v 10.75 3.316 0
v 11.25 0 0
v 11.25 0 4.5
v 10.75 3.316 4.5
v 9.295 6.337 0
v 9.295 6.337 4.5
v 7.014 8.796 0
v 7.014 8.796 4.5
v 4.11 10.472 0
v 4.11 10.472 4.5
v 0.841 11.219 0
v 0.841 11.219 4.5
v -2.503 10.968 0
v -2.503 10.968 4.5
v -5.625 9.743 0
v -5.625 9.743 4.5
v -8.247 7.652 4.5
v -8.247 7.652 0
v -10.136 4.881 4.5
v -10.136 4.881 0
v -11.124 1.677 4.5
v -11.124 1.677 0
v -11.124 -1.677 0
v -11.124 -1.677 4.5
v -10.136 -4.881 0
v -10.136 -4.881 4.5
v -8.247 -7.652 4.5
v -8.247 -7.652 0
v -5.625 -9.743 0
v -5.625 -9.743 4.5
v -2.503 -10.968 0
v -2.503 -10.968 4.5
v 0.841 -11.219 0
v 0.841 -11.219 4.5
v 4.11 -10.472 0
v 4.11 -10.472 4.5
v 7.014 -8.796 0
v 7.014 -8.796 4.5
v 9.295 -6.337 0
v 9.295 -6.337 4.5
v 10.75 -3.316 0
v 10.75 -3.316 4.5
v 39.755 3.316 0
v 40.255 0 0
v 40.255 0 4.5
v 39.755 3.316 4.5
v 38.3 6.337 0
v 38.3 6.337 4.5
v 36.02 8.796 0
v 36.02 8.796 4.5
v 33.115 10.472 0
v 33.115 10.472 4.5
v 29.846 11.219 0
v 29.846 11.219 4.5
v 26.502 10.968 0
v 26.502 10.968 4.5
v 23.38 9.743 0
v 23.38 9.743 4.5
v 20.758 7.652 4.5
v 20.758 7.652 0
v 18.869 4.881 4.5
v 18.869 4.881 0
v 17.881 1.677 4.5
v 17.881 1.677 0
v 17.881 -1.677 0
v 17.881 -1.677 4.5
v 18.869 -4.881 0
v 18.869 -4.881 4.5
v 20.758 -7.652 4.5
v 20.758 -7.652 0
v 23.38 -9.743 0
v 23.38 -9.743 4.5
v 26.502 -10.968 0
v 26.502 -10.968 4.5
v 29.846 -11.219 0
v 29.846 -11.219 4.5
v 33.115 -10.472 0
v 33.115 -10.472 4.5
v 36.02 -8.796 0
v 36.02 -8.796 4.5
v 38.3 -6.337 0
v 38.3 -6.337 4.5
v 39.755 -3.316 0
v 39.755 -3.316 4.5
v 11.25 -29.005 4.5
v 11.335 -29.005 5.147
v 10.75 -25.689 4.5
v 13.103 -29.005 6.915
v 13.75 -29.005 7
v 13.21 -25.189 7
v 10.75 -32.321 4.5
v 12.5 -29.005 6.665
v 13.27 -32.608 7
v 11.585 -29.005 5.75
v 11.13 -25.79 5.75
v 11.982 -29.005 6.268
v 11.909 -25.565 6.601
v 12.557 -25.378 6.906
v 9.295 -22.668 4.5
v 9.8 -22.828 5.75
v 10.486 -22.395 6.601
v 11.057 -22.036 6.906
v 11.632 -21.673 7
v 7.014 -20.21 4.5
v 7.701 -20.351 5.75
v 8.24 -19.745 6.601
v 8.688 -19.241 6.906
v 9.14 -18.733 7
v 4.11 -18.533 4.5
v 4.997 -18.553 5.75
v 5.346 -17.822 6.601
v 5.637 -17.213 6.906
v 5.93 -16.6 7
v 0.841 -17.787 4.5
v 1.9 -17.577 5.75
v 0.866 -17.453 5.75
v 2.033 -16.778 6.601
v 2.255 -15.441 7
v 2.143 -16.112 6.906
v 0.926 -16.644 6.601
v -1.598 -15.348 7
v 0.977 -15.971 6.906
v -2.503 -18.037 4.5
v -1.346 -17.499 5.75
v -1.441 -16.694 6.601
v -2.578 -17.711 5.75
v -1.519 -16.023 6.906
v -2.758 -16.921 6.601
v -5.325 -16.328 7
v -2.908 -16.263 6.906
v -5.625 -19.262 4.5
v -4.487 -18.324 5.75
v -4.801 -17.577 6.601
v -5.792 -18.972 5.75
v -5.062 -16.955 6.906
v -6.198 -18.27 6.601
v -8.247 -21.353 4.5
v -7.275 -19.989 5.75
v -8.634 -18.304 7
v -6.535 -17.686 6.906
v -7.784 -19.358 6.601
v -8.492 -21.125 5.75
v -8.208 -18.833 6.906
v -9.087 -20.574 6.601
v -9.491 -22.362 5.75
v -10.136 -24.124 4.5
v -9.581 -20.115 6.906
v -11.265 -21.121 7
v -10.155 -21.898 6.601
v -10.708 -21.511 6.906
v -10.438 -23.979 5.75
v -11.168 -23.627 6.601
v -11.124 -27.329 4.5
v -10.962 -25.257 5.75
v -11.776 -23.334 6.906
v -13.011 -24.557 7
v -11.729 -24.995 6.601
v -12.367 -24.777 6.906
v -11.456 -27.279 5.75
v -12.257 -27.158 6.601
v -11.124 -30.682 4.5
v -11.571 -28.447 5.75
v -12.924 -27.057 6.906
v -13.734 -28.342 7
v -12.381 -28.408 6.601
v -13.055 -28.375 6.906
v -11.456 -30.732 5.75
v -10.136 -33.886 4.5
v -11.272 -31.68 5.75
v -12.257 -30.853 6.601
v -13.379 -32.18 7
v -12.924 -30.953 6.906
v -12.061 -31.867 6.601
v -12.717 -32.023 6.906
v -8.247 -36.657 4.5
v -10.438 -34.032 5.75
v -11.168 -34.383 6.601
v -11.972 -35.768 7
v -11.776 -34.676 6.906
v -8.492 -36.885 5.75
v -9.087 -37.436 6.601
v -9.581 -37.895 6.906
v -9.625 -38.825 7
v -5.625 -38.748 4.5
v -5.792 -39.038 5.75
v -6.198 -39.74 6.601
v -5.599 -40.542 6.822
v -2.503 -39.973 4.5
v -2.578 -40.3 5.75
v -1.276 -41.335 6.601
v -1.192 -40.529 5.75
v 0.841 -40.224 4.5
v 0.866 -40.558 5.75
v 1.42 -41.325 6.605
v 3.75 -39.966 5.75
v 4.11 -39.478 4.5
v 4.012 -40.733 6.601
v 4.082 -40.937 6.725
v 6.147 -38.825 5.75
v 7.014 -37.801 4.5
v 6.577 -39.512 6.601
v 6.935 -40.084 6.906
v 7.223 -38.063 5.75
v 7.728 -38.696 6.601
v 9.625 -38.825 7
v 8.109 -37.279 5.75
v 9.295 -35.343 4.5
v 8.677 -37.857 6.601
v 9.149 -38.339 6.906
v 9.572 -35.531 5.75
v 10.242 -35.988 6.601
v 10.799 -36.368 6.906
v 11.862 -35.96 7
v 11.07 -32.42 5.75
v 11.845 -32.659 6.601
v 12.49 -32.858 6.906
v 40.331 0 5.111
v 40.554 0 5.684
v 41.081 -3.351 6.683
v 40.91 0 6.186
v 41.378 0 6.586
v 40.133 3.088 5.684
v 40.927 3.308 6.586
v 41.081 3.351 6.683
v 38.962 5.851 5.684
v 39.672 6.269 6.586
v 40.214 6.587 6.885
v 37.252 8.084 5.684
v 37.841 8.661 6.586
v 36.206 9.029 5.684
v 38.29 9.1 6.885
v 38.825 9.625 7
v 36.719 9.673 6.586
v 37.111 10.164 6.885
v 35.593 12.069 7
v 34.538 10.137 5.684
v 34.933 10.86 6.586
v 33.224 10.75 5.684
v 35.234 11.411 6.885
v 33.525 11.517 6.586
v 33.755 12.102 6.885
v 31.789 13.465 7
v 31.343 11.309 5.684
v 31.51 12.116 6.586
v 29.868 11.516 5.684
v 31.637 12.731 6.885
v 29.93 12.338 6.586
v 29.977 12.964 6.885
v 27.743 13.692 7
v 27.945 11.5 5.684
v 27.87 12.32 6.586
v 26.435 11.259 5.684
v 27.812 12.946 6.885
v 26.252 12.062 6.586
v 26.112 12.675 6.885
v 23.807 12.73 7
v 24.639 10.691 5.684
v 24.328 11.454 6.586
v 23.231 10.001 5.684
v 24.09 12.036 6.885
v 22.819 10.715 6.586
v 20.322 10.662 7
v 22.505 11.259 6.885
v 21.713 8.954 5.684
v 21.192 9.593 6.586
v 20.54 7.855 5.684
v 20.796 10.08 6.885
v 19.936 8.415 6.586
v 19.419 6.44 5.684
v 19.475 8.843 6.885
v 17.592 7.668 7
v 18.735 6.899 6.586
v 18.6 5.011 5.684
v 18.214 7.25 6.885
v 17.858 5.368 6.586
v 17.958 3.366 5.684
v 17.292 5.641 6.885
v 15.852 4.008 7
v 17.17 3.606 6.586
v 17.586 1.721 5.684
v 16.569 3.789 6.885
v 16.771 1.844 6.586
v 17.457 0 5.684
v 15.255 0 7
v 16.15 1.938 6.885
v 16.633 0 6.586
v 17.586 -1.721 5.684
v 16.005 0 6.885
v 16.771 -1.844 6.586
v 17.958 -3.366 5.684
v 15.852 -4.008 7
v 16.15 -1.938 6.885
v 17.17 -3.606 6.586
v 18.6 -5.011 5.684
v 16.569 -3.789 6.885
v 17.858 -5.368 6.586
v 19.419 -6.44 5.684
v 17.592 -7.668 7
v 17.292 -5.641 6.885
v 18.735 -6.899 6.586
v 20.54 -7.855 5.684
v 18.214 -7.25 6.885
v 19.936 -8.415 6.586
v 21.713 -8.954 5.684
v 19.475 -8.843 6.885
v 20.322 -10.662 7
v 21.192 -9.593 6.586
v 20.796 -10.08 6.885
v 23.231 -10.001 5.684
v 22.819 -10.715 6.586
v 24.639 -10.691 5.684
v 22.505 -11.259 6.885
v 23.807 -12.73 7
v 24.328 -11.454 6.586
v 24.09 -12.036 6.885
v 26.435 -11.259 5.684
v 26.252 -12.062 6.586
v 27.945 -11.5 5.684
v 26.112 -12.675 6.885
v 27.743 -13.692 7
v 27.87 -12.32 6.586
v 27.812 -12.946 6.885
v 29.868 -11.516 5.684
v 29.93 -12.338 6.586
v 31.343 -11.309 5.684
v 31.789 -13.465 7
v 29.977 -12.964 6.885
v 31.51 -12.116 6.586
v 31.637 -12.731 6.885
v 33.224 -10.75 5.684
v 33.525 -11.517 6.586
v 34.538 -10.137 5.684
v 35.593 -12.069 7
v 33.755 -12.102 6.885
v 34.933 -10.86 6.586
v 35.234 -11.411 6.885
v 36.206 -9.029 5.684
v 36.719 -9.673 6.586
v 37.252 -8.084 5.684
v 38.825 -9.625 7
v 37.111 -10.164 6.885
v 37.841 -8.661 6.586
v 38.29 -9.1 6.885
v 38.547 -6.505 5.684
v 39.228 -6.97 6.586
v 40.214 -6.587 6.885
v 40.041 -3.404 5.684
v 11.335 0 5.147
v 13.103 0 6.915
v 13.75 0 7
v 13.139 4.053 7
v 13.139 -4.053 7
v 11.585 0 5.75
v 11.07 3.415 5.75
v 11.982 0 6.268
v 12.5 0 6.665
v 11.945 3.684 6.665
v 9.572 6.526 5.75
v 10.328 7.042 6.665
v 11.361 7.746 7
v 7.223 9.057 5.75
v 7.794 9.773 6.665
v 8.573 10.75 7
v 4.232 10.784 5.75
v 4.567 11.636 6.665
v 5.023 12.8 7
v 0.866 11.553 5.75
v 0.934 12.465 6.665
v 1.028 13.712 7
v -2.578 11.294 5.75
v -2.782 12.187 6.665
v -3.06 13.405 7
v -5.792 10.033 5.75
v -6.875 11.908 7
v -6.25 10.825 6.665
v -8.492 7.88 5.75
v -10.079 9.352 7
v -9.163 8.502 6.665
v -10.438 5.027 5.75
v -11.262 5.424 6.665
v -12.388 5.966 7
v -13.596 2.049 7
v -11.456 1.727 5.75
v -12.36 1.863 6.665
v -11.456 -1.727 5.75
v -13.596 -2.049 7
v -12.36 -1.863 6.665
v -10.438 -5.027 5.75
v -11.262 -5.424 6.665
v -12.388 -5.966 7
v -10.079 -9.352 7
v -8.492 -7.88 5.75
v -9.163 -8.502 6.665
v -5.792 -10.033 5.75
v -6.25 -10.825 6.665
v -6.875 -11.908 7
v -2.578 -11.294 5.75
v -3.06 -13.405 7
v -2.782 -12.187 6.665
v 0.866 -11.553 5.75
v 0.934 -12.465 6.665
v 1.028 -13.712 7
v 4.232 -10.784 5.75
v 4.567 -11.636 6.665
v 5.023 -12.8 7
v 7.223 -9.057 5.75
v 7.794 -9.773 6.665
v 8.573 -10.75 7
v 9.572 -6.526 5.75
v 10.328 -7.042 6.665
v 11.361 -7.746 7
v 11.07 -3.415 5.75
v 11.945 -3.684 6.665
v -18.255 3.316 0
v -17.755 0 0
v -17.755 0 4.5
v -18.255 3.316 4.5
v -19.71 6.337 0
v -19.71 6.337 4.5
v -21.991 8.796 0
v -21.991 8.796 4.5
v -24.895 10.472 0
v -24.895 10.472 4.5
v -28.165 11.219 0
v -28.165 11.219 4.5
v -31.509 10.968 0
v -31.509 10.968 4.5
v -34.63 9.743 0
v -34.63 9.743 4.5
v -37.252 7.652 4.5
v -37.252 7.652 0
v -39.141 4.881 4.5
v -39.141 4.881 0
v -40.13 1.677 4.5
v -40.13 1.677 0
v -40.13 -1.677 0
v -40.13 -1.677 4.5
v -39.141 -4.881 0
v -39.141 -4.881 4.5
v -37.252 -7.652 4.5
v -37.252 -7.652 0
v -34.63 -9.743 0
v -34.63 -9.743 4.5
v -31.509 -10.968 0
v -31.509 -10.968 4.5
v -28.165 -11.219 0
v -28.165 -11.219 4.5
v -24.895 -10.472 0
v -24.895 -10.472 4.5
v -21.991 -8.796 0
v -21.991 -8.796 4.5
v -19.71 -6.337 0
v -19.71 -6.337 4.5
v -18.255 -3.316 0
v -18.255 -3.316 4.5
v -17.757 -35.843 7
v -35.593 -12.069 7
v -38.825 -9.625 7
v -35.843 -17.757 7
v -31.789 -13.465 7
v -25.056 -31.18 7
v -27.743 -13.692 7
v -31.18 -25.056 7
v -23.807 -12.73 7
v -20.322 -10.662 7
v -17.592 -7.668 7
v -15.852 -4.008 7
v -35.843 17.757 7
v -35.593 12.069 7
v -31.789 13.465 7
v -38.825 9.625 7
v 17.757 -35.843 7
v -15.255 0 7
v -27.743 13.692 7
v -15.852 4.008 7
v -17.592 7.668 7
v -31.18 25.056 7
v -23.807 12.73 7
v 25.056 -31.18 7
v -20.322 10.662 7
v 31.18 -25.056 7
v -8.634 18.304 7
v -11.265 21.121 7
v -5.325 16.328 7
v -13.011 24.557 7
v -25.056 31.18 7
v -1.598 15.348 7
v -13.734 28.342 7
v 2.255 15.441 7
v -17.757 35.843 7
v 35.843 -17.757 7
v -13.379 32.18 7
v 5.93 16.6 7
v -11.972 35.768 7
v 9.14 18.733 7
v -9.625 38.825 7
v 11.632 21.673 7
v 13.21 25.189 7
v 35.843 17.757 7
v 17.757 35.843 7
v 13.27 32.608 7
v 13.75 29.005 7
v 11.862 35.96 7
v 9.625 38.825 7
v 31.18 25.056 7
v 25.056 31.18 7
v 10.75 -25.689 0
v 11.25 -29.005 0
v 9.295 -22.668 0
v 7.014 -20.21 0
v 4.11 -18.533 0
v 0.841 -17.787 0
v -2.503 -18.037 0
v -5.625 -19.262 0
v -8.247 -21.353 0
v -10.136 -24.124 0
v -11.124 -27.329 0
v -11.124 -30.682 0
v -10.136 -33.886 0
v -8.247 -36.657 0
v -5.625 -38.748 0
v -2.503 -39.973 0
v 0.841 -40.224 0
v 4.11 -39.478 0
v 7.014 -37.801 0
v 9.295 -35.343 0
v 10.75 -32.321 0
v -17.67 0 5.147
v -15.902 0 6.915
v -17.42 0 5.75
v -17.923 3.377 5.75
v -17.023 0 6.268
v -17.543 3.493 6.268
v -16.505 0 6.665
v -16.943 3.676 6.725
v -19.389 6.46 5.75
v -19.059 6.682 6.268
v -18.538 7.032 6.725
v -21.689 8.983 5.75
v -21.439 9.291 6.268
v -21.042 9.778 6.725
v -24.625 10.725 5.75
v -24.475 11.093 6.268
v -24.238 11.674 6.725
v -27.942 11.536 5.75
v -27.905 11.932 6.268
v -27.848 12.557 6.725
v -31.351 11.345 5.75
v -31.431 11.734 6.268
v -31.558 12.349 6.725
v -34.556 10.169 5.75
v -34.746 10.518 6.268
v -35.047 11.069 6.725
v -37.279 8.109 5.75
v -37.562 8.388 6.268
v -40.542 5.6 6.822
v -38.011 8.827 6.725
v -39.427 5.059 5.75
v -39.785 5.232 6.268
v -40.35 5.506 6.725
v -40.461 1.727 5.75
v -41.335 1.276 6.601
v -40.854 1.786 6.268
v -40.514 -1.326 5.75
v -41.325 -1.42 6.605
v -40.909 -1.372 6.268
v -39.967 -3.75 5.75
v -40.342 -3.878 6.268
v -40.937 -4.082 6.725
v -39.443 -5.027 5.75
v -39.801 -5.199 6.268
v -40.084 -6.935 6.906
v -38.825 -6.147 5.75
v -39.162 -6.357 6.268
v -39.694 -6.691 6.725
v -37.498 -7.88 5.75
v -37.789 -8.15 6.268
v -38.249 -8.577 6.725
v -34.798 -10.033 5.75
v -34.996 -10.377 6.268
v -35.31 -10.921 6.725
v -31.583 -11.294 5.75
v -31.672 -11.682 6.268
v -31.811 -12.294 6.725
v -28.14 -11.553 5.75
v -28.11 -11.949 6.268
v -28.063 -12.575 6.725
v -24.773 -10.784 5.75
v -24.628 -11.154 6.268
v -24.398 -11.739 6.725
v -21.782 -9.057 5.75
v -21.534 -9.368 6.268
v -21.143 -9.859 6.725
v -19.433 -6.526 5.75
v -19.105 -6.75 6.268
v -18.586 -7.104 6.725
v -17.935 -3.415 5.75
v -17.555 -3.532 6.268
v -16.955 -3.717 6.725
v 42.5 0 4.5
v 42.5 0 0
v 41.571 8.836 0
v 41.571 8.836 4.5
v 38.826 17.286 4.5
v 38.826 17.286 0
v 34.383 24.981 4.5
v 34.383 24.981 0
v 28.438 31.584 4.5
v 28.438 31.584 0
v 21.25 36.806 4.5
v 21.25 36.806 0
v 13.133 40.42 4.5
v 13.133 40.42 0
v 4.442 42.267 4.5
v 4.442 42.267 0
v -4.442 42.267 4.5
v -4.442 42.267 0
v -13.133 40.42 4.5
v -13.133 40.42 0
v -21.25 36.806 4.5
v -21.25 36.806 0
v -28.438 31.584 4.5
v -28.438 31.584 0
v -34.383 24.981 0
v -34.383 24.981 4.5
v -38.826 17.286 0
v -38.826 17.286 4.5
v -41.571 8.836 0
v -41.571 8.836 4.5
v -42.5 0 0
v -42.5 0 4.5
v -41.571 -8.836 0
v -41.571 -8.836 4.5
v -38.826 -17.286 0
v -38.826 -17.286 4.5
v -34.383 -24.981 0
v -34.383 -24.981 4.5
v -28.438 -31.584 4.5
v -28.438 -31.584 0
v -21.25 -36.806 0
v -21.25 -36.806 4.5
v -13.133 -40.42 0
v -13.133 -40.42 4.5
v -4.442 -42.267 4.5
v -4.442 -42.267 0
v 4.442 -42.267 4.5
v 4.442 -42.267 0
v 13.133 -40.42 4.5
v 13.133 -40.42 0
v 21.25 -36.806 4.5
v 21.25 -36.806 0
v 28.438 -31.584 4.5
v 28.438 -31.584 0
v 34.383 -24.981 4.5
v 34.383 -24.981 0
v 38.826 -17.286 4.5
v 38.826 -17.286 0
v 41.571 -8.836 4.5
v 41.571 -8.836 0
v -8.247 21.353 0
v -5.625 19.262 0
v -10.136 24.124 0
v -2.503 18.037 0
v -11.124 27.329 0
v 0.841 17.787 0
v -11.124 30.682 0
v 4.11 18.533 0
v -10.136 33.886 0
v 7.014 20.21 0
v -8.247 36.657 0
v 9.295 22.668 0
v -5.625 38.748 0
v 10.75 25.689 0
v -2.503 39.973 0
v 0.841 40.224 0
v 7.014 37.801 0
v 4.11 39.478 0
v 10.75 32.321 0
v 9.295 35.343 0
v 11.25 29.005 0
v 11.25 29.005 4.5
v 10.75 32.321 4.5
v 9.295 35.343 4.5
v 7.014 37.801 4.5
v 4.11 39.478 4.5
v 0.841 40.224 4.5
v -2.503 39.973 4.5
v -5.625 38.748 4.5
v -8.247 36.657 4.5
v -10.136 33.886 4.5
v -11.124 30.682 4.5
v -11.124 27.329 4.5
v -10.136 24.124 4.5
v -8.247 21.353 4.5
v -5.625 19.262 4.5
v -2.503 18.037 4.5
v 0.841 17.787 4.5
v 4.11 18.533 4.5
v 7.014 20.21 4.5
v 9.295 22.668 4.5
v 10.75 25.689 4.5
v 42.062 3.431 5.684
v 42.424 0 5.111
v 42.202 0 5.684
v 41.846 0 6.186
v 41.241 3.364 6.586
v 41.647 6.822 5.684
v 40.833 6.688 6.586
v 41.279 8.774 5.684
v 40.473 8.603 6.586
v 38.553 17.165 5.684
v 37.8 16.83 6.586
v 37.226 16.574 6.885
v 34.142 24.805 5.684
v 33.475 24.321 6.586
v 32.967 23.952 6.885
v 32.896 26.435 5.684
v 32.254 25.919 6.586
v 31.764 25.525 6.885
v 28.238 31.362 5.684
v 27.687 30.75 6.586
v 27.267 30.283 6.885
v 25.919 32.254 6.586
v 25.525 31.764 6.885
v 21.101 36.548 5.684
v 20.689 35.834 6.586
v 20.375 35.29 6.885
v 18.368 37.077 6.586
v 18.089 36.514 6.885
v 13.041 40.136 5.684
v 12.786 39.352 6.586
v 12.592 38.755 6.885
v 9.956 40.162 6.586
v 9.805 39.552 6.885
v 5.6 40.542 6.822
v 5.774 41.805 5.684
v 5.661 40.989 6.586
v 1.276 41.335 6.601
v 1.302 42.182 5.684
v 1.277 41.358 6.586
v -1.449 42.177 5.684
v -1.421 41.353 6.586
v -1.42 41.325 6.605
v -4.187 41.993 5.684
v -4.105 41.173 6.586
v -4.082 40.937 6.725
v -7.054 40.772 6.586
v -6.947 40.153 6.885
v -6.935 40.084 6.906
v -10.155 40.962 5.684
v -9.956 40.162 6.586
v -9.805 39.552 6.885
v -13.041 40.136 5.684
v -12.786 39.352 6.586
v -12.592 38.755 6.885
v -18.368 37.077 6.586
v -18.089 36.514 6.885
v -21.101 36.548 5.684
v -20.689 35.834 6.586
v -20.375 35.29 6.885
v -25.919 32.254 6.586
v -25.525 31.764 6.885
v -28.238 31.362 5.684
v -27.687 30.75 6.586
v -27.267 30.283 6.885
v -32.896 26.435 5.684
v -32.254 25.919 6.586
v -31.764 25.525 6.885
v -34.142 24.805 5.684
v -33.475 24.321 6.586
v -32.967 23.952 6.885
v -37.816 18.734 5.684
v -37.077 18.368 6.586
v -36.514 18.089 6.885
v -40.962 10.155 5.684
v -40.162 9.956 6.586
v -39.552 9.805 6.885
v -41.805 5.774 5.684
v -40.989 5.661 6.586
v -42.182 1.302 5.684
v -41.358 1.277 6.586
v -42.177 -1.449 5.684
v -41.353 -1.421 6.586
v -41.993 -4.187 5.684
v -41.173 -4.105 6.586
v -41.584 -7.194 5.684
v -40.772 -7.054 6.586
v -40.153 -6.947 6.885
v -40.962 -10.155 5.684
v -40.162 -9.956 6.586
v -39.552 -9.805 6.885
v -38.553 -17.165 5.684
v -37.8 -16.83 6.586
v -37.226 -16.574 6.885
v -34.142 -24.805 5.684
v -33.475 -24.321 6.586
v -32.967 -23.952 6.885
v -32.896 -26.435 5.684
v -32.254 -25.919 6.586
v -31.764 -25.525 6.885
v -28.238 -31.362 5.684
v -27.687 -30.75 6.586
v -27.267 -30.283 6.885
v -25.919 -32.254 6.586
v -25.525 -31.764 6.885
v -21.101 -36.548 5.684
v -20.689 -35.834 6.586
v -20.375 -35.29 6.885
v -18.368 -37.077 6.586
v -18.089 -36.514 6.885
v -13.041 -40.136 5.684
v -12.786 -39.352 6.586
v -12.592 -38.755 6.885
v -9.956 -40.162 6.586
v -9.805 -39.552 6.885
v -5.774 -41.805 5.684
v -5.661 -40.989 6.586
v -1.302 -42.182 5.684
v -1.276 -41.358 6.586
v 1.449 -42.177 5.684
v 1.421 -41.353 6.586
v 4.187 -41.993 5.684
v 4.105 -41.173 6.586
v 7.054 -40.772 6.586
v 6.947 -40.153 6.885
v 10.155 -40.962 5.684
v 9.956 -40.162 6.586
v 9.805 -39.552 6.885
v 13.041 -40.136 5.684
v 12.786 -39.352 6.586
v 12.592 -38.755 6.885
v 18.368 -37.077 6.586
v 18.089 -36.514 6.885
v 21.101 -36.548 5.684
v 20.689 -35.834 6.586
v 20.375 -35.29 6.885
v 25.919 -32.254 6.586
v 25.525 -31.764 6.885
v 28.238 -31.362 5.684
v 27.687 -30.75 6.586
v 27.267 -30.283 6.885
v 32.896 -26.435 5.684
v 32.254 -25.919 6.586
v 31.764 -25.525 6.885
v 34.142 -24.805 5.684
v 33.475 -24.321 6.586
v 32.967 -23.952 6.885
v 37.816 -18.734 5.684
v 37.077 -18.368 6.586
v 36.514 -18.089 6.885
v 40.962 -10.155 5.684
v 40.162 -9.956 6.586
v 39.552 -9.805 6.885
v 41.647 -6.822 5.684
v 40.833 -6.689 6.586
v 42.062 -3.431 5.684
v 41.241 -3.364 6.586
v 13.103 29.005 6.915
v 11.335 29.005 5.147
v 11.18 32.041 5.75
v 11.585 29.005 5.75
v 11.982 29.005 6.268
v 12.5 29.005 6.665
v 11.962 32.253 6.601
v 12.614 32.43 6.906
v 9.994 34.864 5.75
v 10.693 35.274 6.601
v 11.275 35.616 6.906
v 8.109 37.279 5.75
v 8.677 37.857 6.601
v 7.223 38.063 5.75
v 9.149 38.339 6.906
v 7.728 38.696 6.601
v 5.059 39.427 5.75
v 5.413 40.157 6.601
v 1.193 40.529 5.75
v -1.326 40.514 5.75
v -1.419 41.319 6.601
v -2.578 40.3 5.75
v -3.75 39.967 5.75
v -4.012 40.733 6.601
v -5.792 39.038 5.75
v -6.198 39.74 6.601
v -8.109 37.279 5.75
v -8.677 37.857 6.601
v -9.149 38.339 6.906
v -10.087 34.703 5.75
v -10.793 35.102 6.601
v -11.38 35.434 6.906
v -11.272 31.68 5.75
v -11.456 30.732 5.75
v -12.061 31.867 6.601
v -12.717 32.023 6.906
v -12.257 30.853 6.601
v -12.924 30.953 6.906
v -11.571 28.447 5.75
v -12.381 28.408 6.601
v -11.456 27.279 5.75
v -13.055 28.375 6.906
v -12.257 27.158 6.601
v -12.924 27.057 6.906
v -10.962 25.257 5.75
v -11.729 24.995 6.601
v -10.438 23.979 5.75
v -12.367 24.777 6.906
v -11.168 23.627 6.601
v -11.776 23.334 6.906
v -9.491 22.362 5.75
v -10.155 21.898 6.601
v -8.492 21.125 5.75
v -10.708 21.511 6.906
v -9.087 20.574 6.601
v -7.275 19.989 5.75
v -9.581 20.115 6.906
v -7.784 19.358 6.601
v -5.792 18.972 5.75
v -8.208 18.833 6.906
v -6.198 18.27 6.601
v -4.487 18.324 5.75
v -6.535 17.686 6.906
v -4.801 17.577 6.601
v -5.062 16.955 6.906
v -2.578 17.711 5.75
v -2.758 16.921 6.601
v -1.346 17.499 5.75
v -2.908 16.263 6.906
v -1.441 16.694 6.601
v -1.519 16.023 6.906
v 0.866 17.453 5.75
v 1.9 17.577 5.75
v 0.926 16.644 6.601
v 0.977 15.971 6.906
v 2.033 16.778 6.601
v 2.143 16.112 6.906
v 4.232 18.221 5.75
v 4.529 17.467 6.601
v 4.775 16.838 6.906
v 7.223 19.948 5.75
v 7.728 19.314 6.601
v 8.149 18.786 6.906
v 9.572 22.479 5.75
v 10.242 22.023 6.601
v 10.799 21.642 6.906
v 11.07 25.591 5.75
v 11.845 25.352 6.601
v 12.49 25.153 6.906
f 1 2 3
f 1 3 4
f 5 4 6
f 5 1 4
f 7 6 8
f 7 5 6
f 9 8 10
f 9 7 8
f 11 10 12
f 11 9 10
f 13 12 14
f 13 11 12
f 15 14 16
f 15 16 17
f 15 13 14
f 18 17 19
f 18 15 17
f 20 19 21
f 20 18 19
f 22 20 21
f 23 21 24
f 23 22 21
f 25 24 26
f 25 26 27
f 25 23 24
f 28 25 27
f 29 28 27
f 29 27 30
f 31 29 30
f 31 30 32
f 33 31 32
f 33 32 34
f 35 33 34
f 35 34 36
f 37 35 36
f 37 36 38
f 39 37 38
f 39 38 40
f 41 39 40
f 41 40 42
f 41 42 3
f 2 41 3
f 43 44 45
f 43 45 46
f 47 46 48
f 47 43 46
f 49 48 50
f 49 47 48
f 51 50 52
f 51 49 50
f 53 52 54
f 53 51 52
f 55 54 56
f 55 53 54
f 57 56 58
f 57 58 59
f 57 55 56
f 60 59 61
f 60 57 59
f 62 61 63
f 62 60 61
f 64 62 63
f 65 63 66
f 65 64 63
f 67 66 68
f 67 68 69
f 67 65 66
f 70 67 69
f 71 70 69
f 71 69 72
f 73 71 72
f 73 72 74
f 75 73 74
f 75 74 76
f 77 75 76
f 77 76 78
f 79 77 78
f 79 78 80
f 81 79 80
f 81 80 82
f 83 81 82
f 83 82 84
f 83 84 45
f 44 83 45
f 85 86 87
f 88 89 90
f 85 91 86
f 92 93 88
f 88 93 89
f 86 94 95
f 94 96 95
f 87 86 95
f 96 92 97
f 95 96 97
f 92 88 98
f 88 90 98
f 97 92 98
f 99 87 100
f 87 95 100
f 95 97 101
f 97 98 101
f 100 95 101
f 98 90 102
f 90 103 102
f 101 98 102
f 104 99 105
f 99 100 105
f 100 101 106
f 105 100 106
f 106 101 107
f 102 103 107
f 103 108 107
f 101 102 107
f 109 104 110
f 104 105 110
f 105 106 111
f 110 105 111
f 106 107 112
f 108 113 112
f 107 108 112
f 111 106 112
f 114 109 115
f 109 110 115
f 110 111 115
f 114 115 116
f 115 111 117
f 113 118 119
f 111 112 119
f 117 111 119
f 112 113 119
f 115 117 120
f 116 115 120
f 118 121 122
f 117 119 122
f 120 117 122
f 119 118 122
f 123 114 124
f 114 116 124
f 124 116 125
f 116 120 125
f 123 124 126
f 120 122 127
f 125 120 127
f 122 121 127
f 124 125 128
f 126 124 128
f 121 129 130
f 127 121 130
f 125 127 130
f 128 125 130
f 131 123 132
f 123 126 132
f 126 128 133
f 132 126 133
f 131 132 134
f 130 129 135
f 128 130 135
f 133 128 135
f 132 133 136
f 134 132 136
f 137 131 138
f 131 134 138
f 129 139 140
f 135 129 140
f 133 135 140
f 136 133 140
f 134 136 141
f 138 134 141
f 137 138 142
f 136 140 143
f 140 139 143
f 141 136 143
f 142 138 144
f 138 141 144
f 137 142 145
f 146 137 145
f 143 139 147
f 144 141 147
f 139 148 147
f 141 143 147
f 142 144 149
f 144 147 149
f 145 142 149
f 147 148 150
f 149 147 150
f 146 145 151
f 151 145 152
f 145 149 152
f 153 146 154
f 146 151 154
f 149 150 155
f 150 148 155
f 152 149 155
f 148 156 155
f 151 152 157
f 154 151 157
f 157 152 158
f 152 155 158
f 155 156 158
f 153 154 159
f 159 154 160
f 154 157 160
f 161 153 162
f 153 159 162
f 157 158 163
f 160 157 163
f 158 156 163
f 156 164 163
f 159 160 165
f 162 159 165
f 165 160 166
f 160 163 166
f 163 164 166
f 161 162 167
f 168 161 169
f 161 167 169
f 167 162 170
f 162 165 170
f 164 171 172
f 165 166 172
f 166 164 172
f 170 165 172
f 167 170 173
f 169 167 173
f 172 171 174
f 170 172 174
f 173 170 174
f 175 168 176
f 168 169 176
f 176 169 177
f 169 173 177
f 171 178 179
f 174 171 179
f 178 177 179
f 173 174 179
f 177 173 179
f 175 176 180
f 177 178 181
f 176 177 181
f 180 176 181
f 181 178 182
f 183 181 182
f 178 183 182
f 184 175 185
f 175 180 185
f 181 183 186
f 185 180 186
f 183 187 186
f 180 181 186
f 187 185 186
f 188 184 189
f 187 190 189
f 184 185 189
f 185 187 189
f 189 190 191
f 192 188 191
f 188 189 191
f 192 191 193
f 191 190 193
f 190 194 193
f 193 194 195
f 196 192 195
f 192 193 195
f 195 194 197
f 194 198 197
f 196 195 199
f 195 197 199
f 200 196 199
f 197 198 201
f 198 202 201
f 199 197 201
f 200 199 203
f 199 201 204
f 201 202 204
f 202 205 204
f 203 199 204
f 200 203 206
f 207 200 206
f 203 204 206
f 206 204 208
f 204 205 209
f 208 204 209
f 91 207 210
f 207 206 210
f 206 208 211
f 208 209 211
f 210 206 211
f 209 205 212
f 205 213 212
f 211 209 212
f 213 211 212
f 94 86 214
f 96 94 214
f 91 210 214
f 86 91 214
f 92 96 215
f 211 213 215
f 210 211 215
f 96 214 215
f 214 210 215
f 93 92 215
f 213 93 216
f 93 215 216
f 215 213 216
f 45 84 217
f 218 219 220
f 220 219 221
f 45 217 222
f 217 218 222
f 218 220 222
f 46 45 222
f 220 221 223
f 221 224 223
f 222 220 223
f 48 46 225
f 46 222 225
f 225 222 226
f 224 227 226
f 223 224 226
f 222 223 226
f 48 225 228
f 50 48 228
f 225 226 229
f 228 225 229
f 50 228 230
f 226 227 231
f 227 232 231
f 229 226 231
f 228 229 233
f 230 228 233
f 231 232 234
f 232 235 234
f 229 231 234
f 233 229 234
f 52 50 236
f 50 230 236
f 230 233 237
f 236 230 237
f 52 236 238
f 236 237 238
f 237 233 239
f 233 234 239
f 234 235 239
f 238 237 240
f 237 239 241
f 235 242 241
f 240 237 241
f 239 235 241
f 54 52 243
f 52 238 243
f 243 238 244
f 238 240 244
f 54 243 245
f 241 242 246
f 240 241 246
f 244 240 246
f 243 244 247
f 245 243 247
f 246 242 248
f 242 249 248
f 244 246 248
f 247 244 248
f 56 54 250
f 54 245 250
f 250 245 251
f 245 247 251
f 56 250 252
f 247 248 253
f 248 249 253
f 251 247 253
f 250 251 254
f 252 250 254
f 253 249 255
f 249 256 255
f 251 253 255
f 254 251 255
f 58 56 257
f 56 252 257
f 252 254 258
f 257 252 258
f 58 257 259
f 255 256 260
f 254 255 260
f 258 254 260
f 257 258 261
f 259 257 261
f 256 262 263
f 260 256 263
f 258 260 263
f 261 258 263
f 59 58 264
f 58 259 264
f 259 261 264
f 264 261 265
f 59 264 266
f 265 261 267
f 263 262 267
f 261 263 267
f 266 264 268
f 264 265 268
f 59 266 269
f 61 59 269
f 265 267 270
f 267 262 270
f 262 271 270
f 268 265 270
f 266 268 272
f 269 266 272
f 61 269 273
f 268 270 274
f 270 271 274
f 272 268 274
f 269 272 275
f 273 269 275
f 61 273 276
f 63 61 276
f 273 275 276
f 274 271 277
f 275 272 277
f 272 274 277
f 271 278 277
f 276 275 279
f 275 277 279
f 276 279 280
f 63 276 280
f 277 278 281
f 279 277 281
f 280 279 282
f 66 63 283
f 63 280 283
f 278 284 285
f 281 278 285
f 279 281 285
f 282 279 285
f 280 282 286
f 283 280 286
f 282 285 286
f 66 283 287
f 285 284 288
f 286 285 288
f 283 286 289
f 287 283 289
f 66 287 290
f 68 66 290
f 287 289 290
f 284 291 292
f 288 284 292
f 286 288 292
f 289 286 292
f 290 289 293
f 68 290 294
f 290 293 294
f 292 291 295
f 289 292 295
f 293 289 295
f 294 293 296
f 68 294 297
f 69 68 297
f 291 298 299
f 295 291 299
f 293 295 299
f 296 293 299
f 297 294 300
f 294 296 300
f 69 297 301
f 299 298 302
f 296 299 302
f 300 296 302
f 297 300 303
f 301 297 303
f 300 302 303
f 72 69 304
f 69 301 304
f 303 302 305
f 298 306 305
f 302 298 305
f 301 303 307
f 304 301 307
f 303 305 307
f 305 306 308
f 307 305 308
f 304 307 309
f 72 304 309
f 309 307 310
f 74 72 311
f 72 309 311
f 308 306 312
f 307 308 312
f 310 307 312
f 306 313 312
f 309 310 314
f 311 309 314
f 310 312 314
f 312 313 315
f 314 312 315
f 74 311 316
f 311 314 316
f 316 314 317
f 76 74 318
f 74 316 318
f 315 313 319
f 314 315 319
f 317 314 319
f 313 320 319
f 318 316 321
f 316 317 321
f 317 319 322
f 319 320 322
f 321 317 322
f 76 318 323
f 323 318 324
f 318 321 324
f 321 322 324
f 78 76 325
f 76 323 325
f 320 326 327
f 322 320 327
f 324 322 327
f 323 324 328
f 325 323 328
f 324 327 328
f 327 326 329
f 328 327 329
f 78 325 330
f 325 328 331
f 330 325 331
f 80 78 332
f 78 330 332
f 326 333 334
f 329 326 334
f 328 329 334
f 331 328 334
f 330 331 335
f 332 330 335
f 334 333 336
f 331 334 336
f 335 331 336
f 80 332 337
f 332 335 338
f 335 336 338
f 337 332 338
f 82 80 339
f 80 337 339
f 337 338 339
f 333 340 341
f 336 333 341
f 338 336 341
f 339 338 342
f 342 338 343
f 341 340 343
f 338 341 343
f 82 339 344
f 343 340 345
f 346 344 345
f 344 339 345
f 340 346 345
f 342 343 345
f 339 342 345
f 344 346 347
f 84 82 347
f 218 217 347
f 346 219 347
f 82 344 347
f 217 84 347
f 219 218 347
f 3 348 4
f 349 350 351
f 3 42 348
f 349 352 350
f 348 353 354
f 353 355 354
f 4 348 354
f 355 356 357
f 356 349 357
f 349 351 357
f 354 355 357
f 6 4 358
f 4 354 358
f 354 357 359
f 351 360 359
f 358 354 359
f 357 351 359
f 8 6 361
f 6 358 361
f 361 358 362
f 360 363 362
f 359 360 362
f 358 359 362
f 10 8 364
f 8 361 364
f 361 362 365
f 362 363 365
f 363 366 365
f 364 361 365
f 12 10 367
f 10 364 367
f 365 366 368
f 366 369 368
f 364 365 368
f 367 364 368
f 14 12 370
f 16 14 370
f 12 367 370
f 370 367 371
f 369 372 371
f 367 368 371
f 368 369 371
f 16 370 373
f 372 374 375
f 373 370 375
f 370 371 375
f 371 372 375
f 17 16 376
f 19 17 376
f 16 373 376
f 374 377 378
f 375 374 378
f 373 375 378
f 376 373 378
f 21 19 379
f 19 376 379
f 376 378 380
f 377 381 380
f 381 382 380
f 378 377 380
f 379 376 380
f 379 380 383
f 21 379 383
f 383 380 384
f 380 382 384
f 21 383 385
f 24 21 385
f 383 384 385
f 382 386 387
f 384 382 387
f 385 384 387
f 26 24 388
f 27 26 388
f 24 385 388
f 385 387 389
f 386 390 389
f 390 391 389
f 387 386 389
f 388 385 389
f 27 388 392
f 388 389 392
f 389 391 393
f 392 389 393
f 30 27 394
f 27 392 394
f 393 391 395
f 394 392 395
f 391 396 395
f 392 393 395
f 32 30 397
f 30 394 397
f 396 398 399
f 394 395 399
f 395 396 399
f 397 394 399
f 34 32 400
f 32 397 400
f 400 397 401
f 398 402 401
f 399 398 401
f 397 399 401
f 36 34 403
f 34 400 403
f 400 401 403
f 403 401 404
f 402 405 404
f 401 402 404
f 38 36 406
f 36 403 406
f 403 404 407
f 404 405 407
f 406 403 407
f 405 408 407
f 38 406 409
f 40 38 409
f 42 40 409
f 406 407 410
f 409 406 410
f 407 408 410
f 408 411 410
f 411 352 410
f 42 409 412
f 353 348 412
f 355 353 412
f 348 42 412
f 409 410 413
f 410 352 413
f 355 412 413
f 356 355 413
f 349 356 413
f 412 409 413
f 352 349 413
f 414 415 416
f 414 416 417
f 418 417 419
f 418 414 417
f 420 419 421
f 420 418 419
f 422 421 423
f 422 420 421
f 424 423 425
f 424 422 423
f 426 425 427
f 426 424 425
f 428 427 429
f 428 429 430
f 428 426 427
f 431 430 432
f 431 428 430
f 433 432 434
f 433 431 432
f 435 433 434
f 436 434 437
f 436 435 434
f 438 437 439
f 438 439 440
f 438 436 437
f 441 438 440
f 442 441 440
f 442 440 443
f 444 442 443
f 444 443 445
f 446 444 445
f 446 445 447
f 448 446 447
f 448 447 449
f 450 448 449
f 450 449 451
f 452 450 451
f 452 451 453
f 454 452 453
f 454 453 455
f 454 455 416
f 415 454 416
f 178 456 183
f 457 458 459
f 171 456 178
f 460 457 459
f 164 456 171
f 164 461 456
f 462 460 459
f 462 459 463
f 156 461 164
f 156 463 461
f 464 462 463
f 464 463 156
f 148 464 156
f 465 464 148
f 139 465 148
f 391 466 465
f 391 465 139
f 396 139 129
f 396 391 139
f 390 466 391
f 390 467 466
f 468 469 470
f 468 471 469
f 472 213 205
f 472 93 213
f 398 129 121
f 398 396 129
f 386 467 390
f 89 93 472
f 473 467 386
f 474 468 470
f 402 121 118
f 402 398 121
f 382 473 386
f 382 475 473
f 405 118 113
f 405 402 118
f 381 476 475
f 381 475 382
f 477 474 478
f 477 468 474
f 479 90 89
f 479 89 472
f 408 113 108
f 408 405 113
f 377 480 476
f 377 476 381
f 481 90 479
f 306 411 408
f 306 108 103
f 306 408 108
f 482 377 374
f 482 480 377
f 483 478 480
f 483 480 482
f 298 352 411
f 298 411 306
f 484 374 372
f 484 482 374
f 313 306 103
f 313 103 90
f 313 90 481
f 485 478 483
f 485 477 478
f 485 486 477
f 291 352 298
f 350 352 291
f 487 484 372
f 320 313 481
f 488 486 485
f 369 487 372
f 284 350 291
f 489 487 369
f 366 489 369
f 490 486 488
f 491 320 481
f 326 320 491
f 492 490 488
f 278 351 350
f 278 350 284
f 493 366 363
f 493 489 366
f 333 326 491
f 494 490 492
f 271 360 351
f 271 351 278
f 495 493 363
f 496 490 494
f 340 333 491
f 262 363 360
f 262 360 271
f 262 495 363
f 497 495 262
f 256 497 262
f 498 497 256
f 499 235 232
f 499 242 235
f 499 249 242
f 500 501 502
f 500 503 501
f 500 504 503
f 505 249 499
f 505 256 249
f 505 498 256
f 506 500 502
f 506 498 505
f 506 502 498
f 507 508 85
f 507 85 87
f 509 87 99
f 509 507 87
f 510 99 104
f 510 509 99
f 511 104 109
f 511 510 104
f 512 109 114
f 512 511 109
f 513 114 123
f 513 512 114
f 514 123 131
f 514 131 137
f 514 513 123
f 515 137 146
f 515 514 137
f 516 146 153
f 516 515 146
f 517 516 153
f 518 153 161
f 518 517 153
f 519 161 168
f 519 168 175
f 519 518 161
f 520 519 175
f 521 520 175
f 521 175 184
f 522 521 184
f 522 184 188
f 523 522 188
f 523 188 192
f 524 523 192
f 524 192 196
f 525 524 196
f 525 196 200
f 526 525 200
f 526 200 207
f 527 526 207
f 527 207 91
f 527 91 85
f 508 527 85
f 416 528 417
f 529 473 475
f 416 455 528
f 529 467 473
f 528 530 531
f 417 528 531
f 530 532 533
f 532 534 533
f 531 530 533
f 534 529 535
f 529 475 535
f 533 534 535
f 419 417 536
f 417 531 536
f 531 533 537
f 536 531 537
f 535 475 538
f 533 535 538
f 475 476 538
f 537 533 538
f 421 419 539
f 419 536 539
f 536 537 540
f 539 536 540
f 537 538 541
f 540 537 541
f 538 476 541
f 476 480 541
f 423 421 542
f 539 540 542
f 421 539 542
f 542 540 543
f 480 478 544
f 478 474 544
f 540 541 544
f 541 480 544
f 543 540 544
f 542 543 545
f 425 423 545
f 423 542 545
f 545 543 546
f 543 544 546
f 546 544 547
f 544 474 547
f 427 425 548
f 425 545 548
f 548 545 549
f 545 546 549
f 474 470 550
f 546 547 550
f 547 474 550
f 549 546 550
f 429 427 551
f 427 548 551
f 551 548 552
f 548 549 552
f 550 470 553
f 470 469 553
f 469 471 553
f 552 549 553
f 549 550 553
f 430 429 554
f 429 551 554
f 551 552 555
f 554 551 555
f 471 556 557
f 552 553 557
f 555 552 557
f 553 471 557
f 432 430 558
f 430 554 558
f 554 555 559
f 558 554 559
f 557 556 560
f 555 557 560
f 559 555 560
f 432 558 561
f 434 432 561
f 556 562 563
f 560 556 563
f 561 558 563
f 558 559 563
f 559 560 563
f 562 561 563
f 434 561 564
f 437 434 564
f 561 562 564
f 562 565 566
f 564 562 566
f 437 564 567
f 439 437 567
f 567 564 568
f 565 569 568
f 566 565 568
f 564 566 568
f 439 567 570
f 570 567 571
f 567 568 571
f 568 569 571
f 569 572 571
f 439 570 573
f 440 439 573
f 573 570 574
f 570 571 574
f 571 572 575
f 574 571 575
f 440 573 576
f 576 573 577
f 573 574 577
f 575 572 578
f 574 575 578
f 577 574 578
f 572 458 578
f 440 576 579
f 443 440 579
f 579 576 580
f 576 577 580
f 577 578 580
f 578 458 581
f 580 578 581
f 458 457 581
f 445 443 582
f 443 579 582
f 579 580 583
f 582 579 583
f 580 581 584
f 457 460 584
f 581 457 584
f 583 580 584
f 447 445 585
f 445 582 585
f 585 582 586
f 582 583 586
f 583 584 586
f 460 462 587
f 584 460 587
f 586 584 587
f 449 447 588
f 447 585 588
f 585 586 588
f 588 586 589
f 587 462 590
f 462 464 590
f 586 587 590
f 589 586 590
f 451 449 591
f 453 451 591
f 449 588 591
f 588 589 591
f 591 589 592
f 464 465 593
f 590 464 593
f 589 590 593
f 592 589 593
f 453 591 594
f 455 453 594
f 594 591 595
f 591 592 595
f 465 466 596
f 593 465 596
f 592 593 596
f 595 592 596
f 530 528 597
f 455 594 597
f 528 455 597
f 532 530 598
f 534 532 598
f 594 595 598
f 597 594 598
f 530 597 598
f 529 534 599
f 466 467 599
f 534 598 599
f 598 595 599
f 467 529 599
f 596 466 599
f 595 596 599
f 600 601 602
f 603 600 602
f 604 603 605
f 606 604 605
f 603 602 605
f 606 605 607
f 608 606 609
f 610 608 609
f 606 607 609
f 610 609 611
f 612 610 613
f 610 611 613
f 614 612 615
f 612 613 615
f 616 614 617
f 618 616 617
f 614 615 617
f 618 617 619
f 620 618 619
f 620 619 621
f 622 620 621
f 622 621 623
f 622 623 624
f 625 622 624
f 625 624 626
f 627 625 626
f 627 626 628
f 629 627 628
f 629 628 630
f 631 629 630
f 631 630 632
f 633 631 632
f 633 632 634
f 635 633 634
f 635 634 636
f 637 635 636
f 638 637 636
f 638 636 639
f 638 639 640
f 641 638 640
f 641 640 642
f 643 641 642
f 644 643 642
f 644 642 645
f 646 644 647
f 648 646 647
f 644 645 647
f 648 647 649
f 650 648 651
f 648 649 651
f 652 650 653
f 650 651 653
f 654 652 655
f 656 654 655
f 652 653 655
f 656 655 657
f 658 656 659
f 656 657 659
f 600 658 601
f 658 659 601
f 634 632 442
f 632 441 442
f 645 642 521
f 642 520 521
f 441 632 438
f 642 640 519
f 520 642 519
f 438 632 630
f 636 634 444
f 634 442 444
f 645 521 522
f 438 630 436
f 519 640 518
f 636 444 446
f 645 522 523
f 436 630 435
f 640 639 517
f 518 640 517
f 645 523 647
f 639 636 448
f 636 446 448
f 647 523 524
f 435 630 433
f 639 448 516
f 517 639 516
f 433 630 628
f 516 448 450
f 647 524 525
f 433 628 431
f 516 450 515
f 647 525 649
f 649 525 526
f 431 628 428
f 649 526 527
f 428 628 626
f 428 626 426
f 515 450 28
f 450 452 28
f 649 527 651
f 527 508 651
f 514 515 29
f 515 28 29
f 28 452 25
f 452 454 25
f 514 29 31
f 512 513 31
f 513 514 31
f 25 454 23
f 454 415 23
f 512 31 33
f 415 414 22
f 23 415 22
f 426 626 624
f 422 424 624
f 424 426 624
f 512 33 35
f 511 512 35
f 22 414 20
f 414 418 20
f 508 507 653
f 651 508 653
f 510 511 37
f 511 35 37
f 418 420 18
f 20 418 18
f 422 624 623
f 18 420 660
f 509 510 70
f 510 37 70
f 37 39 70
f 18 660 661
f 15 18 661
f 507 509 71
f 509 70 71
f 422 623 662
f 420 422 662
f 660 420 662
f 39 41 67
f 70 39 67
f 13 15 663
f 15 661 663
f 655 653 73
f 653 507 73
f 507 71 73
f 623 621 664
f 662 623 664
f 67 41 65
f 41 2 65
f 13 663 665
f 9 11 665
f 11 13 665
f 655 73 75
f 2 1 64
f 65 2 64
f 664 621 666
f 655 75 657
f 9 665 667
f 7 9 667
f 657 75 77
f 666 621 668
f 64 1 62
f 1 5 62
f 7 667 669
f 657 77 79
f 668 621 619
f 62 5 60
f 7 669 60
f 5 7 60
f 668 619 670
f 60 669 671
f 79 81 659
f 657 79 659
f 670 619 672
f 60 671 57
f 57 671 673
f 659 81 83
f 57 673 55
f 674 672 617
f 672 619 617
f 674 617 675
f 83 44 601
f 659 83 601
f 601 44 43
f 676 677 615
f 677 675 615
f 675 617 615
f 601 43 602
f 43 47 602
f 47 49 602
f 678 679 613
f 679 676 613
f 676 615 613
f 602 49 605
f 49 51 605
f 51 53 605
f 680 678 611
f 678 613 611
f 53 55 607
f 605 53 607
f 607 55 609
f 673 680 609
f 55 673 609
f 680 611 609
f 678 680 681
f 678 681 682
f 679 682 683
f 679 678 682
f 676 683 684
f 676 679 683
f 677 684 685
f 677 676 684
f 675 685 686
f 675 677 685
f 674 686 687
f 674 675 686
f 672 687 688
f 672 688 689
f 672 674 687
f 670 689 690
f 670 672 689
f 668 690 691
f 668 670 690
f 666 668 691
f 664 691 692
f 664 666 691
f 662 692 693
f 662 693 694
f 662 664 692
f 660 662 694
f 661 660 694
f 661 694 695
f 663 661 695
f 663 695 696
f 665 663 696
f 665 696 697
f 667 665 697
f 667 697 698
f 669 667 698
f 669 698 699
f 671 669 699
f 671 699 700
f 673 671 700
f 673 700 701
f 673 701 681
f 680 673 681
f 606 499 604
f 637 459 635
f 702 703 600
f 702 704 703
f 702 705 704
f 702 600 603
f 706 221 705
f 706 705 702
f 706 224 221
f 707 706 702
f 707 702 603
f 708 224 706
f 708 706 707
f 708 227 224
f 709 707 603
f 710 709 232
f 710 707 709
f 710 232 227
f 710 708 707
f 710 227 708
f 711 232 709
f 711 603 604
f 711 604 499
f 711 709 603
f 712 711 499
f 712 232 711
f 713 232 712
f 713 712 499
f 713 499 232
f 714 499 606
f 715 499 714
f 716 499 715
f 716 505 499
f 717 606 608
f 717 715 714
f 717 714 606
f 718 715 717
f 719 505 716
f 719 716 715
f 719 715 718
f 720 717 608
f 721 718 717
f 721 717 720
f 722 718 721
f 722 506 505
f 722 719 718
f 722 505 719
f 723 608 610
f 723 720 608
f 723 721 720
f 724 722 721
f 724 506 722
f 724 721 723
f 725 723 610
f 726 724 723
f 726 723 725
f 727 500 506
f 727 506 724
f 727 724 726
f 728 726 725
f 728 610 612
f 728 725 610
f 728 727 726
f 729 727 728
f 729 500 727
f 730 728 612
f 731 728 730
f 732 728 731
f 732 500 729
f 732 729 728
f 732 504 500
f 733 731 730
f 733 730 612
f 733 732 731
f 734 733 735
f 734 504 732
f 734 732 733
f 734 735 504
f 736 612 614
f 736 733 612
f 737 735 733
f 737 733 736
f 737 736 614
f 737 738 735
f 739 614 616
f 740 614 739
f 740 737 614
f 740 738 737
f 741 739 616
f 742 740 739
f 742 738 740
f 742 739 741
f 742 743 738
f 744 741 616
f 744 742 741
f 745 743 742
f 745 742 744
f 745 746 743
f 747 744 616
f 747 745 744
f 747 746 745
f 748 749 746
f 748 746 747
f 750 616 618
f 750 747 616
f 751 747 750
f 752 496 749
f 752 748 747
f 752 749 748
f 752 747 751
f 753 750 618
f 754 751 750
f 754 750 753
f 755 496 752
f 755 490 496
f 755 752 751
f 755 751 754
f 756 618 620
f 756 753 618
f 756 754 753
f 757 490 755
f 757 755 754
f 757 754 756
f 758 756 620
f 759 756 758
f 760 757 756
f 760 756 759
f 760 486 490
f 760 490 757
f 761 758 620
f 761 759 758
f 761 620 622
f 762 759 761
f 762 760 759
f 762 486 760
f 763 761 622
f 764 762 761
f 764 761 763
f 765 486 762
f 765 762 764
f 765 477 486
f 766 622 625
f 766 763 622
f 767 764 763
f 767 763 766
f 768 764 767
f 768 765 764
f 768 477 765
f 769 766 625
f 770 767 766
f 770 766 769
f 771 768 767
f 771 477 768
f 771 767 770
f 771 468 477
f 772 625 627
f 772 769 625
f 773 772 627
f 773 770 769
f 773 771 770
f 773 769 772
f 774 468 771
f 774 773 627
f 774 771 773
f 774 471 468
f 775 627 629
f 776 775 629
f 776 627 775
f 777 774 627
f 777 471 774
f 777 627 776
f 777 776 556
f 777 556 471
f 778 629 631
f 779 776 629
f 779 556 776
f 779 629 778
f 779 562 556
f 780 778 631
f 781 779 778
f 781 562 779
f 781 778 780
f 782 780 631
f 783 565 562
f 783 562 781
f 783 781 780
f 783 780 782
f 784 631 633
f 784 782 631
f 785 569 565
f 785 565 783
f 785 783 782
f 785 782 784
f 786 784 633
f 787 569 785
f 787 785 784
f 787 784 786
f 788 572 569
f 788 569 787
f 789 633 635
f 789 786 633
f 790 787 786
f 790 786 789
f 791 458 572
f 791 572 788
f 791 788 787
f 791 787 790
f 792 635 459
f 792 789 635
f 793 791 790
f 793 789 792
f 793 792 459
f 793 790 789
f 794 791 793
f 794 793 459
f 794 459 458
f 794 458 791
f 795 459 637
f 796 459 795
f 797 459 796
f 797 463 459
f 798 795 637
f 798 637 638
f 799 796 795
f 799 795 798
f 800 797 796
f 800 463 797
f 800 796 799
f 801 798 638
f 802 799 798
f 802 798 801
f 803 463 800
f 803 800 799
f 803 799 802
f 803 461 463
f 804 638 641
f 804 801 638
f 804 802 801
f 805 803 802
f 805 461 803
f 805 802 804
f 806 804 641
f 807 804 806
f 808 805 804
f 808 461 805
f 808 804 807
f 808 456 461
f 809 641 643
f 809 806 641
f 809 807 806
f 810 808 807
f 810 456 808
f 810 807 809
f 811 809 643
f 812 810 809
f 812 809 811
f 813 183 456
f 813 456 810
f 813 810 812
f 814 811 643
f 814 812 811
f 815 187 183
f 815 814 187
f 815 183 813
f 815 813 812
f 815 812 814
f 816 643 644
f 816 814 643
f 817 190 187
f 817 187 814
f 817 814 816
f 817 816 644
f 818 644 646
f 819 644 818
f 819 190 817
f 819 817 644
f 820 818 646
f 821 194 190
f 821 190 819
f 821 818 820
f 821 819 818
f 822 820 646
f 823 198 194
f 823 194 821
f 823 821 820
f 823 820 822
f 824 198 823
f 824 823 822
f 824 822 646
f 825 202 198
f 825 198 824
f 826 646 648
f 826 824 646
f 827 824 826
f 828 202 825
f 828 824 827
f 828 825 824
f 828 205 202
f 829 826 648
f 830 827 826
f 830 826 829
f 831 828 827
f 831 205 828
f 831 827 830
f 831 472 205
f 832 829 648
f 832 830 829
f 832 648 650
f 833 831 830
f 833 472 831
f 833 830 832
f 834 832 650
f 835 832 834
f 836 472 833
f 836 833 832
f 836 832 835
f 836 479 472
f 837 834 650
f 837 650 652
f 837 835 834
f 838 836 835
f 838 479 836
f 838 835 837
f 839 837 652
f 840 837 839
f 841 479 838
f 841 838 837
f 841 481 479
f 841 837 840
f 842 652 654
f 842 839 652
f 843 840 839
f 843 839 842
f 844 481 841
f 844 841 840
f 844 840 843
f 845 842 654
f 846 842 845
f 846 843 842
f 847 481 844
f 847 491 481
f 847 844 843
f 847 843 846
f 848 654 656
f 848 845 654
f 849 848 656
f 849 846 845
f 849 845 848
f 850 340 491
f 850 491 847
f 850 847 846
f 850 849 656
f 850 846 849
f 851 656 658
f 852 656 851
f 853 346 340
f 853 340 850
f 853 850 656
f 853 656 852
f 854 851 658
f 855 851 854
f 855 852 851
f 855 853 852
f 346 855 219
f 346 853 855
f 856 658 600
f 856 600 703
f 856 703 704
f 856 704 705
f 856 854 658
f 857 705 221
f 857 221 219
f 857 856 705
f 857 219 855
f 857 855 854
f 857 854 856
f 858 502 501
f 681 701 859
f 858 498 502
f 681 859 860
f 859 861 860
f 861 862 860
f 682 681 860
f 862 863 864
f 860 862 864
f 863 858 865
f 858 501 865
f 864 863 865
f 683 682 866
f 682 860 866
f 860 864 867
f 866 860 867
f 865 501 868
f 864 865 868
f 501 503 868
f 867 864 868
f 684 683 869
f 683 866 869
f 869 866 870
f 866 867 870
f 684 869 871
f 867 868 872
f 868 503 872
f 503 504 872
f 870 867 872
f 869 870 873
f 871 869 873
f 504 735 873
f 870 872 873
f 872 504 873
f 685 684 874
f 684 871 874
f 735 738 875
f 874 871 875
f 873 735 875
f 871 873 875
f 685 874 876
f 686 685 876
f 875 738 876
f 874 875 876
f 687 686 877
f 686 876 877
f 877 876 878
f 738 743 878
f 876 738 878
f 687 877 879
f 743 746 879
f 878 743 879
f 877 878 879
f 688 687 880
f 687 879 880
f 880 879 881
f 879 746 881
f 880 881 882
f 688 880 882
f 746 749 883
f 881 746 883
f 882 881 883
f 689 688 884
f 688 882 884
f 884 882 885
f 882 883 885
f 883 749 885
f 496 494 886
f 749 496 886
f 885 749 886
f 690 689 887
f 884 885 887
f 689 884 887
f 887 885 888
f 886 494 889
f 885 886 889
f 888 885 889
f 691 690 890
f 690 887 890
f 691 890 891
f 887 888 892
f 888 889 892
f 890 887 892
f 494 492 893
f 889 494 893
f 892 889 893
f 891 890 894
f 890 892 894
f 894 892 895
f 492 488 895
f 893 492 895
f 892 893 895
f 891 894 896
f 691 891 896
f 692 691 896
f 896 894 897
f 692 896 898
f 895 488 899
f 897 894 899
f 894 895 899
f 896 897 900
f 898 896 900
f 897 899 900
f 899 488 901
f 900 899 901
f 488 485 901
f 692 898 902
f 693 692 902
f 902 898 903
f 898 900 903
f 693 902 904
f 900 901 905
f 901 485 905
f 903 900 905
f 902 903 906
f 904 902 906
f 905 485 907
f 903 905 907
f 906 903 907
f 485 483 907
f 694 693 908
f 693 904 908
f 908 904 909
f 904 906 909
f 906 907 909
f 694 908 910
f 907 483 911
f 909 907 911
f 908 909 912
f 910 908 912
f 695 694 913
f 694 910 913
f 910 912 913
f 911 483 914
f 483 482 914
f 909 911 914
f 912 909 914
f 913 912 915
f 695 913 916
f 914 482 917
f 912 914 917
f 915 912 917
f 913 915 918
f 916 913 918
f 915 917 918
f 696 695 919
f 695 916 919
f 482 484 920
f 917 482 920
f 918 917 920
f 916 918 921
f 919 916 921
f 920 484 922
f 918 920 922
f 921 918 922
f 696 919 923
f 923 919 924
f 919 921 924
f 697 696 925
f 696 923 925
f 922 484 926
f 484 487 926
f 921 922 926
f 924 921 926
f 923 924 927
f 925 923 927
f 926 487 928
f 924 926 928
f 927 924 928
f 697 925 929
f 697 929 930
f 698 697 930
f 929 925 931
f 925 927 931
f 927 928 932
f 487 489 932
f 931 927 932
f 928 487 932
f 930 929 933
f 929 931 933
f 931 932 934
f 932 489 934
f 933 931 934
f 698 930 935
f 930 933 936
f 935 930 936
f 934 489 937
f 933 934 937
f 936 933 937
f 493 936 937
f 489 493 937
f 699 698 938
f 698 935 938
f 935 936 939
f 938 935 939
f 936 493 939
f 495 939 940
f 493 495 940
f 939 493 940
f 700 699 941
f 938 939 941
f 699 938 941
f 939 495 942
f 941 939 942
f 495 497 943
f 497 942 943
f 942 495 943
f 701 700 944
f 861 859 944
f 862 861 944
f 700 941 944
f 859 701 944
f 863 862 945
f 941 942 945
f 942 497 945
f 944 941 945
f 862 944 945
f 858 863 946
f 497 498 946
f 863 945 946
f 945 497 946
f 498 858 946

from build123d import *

# Parameters (mm, degrees)
F0_R     = 42.5
F0_R_2   = 11.25
F1_DEPTH = 7


# Not quite as in the source:
# - a fillet or chamfer that OpenCascade refuses, or shapes differently, is made with other operations: its cross-section is extruded or revolved along the edge and cut away or added


with BuildPart() as f1:
    # F0 (on Top) → F1 (new body)
    with BuildSketch(Plane.XY):
        Circle(F0_R)
        with Locations((0, -29.0052499622)):
            Circle(F0_R_2, mode=Mode.SUBTRACT)
        with Locations((-29.0052499622, 0)):
            Circle(F0_R_2, mode=Mode.SUBTRACT)
        Circle(F0_R_2, mode=Mode.SUBTRACT)
        with Locations((29.0052499622, 0)):
            Circle(F0_R_2, mode=Mode.SUBTRACT)
        with Locations((0, 29.0052499622)):
            Circle(F0_R_2, mode=Mode.SUBTRACT)
    extrude(amount=F1_DEPTH)

    # F2: fillet of radius 2.5 on 6 edges, made by hand

    # F2_s1 → F2_t2 (revolve, cut)
    with BuildSketch(Plane.XZ):
        with BuildLine():
            ThreePointArc((42.5, 4.5), (41.767766953, 6.267766953), (40, 7))
            Line((40, 7), (42.5, 7))
            Line((42.5, 7), (42.5, 4.5))
        make_face()
    revolve(axis=Axis((0, 0, 7), (0, 0, 1)), mode=Mode.SUBTRACT)

    # F2_s3 → F2_t4 (revolve, cut)
    with BuildSketch(Plane.XZ.offset(29.0052499622)):
        with BuildLine():
            ThreePointArc((11.25, 4.5), (11.982233047, 6.267766953), (13.75, 7))
            Line((13.75, 7), (11.25, 7))
            Line((11.25, 7), (11.25, 4.5))
        make_face()
    revolve(axis=Axis((0, -29.0052499622, 7), (0, 0, 1)), mode=Mode.SUBTRACT)

    # F2_s5 → F2_t6 (revolve, cut)
    with BuildSketch(Plane.XZ):
        with BuildLine():
            ThreePointArc((-17.7552499622, 4.5), (-17.0230169152, 6.267766953), (-15.2552499622, 7))
            Line((-15.2552499622, 7), (-17.7552499622, 7))
            Line((-17.7552499622, 7), (-17.7552499622, 4.5))
        make_face()
    revolve(axis=Axis((-29.0052499622, 0, 7), (0, 0, 1)), mode=Mode.SUBTRACT)

    # F2_s7 → F2_t8 (revolve, cut)
    with BuildSketch(Plane.XZ):
        with BuildLine():
            ThreePointArc((11.25, 4.5), (11.982233047, 6.267766953), (13.75, 7))
            Line((13.75, 7), (11.25, 7))
            Line((11.25, 7), (11.25, 4.5))
        make_face()
    revolve(axis=Axis((0, 0, 7), (0, 0, 1)), mode=Mode.SUBTRACT)

    # F2_s9 → F2_t10 (revolve, cut)
    with BuildSketch(Plane.XZ):
        with BuildLine():
            ThreePointArc((40.2552499622, 4.5), (40.9874830092, 6.267766953), (42.7552499622, 7))
            Line((42.7552499622, 7), (40.2552499622, 7))
            Line((40.2552499622, 7), (40.2552499622, 4.5))
        make_face()
    revolve(axis=Axis((29.0052499622, 0, 7), (0, 0, 1)), mode=Mode.SUBTRACT)

    # F2_s11 → F2_t12 (revolve, cut)
    with BuildSketch(Plane.XZ.offset(-29.0052499622)):
        with BuildLine():
            ThreePointArc((11.25, 4.5), (11.982233047, 6.267766953), (13.75, 7))
            Line((13.75, 7), (11.25, 7))
            Line((11.25, 7), (11.25, 4.5))
        make_face()
    revolve(axis=Axis((0, 29.0052499622, 7), (0, 0, 1)), mode=Mode.SUBTRACT)


solid = f1.part
